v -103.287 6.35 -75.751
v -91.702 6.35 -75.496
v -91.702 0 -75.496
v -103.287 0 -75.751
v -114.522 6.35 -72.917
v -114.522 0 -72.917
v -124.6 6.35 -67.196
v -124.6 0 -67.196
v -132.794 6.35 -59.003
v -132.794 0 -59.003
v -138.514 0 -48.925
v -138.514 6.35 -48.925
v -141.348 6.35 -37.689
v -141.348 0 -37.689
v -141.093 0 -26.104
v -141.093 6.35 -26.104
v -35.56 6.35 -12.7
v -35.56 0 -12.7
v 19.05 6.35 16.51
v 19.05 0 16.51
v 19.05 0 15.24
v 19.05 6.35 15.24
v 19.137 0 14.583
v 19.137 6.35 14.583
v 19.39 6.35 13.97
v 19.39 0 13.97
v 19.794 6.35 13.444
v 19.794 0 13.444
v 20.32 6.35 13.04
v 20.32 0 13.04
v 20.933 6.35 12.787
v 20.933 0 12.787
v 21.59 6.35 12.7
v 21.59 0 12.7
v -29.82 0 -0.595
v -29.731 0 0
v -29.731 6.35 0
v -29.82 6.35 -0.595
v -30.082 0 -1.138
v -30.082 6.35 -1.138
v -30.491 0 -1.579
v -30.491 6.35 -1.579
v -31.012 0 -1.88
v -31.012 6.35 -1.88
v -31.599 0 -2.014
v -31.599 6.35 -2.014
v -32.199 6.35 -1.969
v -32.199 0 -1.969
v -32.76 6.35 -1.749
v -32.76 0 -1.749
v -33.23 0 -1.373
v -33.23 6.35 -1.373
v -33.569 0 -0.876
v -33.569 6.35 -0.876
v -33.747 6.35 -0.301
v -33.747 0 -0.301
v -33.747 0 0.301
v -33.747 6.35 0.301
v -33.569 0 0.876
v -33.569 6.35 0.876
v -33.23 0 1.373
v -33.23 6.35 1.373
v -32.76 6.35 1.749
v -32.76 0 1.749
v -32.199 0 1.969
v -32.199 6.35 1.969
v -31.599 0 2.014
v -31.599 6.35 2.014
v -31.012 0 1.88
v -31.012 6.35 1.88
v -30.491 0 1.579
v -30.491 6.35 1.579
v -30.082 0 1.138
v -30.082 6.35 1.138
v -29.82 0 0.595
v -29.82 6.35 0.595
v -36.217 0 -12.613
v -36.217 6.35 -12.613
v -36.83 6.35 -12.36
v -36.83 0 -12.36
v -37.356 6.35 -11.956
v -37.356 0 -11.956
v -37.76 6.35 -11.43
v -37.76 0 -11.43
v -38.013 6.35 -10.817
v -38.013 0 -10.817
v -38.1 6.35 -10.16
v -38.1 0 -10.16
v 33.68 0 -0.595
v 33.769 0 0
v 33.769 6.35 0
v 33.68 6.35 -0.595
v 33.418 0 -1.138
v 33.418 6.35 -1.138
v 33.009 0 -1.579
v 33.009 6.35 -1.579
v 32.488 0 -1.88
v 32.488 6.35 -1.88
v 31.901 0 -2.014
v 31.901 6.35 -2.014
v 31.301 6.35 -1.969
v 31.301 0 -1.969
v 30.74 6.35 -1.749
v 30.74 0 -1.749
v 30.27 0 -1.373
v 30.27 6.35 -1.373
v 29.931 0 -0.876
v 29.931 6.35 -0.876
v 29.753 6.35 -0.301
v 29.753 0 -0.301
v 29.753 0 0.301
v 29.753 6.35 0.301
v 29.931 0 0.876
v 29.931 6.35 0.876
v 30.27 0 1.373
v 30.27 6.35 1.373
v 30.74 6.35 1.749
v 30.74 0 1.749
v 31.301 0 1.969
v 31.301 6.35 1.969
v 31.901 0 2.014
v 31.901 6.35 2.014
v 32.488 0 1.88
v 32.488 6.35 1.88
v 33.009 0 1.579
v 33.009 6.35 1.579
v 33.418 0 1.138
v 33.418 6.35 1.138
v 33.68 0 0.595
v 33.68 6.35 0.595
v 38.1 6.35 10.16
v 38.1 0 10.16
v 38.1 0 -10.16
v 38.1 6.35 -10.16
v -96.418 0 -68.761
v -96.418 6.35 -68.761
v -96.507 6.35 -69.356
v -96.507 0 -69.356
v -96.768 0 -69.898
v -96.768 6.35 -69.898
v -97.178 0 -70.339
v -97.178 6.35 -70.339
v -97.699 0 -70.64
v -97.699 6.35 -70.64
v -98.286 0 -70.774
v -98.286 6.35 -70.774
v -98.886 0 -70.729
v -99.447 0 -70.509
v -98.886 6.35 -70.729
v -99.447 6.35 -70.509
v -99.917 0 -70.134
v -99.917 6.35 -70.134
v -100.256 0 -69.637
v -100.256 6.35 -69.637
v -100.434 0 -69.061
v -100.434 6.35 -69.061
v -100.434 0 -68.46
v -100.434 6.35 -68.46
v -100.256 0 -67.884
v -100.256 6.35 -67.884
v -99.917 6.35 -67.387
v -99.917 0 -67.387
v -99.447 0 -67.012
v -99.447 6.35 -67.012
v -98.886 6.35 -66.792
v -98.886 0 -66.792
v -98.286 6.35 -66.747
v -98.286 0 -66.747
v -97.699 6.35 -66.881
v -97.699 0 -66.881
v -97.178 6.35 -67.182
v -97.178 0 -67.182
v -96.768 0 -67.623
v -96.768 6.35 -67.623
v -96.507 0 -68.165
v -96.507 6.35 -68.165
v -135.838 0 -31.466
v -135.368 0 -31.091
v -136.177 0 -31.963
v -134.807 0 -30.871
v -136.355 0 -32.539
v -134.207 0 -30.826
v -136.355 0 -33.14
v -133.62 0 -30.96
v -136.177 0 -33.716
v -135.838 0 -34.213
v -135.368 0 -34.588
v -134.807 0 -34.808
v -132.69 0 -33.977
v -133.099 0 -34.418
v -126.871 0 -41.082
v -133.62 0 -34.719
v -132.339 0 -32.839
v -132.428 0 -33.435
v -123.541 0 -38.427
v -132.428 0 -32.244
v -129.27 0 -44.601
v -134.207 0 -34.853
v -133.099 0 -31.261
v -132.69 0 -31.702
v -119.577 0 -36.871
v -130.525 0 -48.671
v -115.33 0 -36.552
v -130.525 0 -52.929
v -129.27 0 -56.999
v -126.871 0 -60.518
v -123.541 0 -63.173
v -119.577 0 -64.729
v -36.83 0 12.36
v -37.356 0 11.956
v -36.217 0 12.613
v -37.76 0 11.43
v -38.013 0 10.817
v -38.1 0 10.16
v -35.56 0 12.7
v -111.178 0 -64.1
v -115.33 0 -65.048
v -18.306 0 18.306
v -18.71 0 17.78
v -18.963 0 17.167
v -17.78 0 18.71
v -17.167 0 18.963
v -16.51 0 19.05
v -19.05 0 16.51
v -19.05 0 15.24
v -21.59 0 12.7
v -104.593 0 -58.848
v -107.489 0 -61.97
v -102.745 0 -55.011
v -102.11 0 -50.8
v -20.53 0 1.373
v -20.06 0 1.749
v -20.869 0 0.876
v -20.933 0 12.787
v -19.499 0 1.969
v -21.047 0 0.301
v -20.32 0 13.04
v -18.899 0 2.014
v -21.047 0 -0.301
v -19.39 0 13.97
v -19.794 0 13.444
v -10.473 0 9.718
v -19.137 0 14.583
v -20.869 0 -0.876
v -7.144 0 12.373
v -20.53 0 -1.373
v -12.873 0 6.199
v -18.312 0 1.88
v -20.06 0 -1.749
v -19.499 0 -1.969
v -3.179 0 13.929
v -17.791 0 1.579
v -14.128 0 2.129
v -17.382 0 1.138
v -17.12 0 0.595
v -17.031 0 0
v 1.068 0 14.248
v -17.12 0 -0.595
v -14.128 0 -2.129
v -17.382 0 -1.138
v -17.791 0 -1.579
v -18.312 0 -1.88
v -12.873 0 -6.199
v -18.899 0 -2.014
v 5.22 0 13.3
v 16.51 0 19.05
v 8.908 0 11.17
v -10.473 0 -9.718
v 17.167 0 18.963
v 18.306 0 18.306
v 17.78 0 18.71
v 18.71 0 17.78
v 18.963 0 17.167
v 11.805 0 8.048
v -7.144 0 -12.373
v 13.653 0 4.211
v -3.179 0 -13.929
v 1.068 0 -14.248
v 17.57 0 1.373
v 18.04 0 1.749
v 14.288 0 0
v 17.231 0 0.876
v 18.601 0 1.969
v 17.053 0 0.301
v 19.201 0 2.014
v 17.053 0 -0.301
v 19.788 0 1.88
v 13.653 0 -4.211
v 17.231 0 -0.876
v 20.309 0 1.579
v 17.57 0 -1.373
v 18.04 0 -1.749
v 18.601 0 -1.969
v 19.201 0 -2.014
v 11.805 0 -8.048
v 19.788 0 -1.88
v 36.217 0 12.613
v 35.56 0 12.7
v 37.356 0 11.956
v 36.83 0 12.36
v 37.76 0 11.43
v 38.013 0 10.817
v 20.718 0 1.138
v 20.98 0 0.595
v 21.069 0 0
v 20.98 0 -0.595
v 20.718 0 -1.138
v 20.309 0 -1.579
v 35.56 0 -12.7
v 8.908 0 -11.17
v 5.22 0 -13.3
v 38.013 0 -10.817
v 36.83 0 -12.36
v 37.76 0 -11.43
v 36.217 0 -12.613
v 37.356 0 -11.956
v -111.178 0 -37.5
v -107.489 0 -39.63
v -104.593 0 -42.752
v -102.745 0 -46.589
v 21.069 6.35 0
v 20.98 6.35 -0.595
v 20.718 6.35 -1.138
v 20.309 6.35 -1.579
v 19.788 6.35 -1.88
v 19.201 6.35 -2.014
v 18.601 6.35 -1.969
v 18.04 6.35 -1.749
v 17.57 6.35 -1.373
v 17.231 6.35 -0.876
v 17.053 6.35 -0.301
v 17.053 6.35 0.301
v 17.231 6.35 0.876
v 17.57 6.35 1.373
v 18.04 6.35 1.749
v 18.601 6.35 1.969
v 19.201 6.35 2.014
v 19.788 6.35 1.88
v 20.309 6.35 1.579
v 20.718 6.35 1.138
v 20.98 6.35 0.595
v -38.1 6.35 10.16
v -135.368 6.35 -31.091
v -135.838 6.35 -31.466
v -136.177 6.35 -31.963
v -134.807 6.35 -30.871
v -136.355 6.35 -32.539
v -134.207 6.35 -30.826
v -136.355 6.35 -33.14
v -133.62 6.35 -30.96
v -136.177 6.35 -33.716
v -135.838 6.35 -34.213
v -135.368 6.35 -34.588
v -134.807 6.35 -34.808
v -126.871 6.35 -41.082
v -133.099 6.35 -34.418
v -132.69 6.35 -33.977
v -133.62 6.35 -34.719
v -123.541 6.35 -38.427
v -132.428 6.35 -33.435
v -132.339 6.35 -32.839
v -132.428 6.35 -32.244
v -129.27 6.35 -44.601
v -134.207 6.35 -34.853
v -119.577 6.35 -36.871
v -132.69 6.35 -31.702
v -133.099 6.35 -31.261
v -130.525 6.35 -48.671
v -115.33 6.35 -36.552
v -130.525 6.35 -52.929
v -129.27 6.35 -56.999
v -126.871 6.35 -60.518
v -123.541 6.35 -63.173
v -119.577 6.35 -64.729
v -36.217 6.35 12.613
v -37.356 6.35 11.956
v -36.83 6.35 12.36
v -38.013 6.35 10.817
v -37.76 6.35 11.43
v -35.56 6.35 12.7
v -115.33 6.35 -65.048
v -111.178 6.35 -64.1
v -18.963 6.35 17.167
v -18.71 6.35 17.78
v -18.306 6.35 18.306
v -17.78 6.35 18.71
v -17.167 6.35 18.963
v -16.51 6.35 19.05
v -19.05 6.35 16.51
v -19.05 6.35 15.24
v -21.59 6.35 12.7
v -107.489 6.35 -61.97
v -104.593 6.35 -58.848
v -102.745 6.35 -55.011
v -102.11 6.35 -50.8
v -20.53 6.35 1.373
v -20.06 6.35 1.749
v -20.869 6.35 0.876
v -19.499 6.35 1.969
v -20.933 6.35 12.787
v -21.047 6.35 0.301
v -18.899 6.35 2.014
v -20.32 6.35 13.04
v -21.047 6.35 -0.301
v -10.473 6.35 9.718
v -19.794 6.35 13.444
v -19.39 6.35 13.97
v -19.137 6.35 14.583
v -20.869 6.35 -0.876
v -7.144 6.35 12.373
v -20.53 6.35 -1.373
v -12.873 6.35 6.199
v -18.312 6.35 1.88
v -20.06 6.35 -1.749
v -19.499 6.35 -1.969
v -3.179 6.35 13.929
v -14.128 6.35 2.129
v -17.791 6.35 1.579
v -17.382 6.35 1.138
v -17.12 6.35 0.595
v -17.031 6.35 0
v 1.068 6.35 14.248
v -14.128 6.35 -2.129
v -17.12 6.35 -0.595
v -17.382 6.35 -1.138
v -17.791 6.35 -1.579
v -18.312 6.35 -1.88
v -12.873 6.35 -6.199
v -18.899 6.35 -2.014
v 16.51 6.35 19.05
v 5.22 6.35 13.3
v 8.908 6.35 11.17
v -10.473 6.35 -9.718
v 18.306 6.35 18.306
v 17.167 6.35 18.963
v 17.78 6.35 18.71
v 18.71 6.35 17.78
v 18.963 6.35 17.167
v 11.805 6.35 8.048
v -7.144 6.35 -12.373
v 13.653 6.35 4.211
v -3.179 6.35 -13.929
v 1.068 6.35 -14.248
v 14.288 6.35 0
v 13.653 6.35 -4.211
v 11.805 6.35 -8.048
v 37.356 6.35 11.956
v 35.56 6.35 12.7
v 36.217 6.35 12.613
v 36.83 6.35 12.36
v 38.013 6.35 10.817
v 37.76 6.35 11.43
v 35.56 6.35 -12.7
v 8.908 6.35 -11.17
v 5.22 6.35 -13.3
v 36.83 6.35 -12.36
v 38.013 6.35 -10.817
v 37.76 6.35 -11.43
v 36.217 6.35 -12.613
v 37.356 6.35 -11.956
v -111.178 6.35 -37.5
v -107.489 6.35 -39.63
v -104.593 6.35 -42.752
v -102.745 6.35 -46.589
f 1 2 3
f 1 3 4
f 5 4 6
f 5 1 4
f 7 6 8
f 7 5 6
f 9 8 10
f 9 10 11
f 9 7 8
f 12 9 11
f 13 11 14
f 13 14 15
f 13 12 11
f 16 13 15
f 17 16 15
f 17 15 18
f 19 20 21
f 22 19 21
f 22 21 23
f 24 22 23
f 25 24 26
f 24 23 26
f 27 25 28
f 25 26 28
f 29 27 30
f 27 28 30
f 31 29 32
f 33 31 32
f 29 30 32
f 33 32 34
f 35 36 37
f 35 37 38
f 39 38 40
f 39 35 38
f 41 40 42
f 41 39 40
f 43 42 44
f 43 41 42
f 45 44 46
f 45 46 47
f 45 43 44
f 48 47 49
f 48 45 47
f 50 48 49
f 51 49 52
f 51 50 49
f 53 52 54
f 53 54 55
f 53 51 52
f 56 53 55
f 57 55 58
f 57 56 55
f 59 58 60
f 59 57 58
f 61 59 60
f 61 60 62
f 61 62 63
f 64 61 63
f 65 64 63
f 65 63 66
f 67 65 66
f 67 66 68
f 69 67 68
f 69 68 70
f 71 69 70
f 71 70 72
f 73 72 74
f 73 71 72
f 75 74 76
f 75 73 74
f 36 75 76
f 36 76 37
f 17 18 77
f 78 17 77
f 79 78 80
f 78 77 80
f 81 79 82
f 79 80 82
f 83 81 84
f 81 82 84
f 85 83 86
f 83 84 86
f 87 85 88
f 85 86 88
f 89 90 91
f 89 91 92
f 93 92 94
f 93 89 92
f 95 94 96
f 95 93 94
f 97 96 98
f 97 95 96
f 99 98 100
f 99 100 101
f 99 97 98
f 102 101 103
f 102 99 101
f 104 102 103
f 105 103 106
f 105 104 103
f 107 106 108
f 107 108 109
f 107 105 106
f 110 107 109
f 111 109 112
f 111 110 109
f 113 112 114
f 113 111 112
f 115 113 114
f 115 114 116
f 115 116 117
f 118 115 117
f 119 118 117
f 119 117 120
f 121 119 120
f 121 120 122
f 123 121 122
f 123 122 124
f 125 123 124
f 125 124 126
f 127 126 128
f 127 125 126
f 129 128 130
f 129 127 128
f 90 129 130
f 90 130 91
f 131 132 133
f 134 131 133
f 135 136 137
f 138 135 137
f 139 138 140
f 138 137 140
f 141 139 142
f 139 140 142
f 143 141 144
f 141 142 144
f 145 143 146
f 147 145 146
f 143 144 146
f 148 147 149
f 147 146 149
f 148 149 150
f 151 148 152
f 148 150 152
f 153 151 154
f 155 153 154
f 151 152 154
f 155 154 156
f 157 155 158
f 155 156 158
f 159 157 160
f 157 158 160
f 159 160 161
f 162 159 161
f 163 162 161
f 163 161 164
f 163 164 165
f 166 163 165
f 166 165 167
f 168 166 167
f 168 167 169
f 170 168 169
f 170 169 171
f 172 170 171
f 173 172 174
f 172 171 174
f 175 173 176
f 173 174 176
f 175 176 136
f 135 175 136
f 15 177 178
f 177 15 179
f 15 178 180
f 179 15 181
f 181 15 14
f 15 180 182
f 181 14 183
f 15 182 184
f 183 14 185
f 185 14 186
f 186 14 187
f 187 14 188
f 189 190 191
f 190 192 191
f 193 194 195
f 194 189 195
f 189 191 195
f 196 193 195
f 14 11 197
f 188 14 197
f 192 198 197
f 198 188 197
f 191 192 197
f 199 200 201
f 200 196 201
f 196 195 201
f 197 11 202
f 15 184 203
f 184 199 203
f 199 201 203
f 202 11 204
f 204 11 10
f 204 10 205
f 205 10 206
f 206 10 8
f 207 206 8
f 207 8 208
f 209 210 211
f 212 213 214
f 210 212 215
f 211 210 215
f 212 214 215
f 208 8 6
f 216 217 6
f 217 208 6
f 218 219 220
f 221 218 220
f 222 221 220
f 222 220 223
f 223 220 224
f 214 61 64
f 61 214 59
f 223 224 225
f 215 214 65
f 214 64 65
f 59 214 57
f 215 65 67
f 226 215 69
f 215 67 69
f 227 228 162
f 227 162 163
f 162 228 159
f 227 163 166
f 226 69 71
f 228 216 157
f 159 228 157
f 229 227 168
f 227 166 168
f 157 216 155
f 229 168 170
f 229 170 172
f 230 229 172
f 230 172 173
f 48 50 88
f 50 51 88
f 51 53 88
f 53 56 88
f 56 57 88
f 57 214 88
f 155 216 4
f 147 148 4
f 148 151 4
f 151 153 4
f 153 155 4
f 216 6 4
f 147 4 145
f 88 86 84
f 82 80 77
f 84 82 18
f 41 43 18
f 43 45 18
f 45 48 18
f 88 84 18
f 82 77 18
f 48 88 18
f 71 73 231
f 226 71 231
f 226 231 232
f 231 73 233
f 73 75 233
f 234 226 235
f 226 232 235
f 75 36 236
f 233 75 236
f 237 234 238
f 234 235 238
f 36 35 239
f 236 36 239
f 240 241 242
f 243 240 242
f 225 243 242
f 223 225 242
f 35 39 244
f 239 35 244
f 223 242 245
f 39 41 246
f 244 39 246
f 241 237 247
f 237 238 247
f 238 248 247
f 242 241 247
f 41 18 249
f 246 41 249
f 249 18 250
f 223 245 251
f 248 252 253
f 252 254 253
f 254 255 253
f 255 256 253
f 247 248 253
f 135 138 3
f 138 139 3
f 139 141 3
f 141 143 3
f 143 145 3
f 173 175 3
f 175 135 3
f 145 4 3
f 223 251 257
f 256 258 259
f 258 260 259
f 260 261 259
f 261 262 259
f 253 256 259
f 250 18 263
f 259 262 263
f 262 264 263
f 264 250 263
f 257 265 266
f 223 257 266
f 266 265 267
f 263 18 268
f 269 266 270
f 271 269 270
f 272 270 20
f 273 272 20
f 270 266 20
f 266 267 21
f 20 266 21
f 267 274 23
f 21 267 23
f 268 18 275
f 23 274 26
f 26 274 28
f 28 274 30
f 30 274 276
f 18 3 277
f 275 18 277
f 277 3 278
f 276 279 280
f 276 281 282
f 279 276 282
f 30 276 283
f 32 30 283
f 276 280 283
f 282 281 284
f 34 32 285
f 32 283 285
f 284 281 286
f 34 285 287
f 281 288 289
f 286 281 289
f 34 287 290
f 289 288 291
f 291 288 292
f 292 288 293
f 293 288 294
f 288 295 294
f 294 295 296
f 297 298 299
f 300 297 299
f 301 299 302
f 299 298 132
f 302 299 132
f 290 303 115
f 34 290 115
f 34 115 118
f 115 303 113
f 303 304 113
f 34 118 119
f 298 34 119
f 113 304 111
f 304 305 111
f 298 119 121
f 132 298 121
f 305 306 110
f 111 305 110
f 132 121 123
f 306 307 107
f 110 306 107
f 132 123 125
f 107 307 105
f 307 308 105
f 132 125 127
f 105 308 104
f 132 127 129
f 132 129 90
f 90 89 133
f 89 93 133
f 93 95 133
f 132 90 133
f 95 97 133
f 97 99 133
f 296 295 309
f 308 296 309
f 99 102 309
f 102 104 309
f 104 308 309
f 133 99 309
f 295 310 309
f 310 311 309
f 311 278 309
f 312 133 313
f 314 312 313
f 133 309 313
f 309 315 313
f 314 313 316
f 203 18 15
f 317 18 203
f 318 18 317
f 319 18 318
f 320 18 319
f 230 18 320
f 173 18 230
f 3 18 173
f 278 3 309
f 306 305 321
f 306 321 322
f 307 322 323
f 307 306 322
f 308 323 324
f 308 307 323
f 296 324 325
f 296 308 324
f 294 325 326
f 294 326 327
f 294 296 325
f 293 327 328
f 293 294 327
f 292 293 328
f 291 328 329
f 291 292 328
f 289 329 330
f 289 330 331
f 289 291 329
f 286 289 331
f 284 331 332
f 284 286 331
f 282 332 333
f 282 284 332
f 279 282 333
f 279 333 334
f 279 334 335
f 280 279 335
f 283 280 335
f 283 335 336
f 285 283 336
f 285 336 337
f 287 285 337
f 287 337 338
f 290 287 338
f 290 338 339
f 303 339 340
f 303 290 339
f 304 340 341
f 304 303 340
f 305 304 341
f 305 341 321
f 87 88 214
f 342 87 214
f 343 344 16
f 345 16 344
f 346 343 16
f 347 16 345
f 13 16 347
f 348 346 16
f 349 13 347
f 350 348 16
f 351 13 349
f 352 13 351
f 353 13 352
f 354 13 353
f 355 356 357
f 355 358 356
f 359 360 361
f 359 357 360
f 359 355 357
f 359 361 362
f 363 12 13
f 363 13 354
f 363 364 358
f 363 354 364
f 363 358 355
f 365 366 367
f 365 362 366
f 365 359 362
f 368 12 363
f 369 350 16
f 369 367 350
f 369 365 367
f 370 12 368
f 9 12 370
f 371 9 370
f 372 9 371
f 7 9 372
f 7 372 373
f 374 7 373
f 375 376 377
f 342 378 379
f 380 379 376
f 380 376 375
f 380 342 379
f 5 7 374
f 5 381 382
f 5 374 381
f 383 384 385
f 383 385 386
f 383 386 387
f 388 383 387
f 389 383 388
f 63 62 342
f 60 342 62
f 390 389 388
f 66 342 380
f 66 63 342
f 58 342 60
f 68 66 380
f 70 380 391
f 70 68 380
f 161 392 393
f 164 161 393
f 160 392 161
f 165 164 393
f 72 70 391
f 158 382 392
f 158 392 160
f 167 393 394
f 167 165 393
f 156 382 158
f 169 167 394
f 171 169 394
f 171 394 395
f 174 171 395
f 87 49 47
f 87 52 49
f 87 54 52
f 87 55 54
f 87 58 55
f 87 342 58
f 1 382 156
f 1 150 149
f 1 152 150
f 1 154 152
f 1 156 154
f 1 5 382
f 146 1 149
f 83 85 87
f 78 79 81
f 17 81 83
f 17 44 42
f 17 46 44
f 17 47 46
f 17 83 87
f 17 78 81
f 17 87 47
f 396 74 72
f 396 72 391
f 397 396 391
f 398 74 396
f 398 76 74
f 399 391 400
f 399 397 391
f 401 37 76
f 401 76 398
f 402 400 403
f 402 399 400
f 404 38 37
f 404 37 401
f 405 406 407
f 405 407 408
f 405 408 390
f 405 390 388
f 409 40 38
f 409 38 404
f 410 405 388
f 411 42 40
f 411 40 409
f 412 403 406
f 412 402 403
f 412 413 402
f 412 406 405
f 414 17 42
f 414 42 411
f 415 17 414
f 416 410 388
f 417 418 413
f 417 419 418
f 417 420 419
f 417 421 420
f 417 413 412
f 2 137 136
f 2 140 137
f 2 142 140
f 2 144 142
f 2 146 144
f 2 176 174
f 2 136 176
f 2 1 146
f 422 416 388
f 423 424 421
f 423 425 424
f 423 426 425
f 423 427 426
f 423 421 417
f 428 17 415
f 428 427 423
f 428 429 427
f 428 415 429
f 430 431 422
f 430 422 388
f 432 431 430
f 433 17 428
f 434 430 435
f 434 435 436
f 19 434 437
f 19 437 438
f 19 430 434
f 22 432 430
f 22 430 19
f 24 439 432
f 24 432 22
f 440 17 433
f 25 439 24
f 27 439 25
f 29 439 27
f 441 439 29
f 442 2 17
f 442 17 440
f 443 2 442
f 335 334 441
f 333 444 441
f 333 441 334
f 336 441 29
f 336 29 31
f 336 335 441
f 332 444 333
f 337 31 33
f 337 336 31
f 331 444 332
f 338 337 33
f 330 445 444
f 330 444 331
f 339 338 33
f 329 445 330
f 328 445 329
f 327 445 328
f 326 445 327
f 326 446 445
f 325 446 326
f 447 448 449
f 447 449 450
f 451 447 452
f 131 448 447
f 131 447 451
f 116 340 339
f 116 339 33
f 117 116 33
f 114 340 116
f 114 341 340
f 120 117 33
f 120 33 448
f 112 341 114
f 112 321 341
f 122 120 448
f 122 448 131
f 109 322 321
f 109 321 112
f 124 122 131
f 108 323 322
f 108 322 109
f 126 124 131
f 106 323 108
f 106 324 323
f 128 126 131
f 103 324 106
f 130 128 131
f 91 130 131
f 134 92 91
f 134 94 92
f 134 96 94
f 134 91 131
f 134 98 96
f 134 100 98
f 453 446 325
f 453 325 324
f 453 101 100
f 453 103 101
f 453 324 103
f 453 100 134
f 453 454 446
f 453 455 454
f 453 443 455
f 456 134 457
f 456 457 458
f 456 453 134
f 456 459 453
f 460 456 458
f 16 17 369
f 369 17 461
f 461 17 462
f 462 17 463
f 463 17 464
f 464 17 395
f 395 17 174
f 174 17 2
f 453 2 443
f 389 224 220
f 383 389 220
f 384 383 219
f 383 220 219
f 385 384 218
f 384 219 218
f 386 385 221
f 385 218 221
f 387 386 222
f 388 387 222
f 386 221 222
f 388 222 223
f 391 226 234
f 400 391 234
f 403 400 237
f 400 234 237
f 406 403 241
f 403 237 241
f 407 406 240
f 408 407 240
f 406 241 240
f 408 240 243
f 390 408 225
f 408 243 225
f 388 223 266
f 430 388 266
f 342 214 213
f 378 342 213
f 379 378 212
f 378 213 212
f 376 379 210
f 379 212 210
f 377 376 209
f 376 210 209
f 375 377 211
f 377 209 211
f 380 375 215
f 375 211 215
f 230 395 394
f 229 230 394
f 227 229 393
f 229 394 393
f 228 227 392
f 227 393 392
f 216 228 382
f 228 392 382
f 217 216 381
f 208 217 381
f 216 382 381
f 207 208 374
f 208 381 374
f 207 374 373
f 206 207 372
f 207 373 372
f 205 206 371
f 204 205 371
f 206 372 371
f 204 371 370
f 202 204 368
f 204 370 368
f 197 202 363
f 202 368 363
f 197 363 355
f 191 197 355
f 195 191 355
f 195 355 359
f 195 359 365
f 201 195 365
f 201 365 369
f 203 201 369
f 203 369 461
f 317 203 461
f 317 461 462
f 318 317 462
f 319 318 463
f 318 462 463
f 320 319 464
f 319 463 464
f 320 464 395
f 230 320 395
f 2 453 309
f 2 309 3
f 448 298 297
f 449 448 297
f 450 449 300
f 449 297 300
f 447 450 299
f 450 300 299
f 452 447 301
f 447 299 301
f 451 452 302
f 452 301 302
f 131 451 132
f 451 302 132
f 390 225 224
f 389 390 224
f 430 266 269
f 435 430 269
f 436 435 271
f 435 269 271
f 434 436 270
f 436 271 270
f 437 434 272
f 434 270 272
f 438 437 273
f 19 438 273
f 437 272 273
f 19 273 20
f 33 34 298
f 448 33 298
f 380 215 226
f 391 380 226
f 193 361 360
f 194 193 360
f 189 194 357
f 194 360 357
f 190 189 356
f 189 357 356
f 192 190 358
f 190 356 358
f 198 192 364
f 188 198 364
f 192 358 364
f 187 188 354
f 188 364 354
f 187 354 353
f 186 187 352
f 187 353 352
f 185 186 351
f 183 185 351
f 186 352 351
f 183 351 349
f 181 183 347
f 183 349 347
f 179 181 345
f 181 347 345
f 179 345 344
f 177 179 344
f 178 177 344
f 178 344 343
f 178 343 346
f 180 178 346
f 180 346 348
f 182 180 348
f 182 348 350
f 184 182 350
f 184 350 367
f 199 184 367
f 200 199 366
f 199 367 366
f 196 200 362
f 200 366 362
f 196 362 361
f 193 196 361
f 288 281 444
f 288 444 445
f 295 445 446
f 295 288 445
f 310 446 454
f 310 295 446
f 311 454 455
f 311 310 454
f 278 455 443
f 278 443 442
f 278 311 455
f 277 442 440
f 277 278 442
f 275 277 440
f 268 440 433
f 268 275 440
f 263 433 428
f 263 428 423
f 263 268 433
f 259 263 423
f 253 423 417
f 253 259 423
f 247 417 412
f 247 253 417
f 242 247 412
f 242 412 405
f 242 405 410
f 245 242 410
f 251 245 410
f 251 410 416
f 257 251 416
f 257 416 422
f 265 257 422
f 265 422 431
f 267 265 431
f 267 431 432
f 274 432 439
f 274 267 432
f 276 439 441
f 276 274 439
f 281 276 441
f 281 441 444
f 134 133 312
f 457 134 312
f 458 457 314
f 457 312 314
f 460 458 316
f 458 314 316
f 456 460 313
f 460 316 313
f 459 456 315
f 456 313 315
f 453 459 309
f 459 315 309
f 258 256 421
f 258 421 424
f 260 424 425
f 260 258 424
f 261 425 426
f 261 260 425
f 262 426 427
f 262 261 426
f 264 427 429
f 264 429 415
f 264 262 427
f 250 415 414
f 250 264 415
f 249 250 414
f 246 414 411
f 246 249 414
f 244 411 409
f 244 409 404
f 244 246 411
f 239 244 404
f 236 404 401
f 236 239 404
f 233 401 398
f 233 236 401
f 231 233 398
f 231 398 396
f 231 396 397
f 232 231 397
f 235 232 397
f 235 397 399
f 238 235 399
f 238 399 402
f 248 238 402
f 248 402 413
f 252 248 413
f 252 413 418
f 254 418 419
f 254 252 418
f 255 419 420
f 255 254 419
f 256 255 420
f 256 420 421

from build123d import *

# Parameters (mm, degrees)
SKETCH1_R           = 14.2875
SKETCH1_R_2         = 2.0193
BOSS_EXTRUDE1_DEPTH = 6.35
SKETCH3_R           = 2.0193
SKETCH3_R_2         = 14.2875
BOSS_EXTRUDE3_DEPTH = 6.35


with BuildPart() as part:
    # Sketch1 → Boss-Extrude1 (new body)
    with BuildSketch(Plane(origin=(0, 0, 0), x_dir=(1, 0, 0), z_dir=(0, 1, 0))):
        with BuildLine():
            Line((-16.51, -19.05), (16.51, -19.05))
            ThreePointArc((16.51, -19.05), (18.306051224, -18.306051224), (19.05, -16.51))
            Line((19.05, -16.51), (19.05, -15.24))
            ThreePointArc((19.05, -15.24), (19.793948776, -13.443948776), (21.59, -12.7))
            Line((21.59, -12.7), (35.56, -12.7))
            ThreePointArc((35.56, -12.7), (37.356051224, -11.956051224), (38.1, -10.16))
            Line((38.1, -10.16), (38.1, 10.16))
            ThreePointArc((38.1, 10.16), (37.356051224, 11.956051224), (35.56, 12.7))
            Line((35.56, 12.7), (21.59, 12.7))
            ThreePointArc((21.59, 12.7), (19.793948776, 13.443948776), (19.05, 15.24))
            Line((19.05, 15.24), (19.05, 16.51))
            ThreePointArc((19.05, 16.51), (18.306051224, 18.306051224), (16.51, 19.05))
            Line((16.51, 19.05), (-16.51, 19.05))
            ThreePointArc((-16.51, 19.05), (-18.306051224, 18.306051224), (-19.05, 16.51))
            Line((-19.05, 16.51), (-19.05, 15.24))
            ThreePointArc((-19.05, 15.24), (-19.793948776, 13.443948776), (-21.59, 12.7))
            Line((-21.59, 12.7), (-35.56, 12.7))
            ThreePointArc((-35.56, 12.7), (-37.356051224, 11.956051224), (-38.1, 10.16))
            Line((-38.1, 10.16), (-38.1, -10.16))
            ThreePointArc((-38.1, -10.16), (-37.356051224, -11.956051224), (-35.56, -12.7))
            Line((-35.56, -12.7), (-21.59, -12.7))
            ThreePointArc((-21.59, -12.7), (-19.793948776, -13.443948776), (-19.05, -15.24))
            Line((-19.05, -15.24), (-19.05, -16.51))
            ThreePointArc((-19.05, -16.51), (-18.306051224, -18.306051224), (-16.51, -19.05))
        make_face()
        Circle(SKETCH1_R, mode=Mode.SUBTRACT)
        with Locations((-31.75, 0)):
            Circle(SKETCH1_R_2, mode=Mode.SUBTRACT)
        with Locations((-19.05, 0)):
            Circle(SKETCH1_R_2, mode=Mode.SUBTRACT)
        with Locations((19.05, 0)):
            Circle(SKETCH1_R_2, mode=Mode.SUBTRACT)
        with Locations((31.75, 0)):
            Circle(SKETCH1_R_2, mode=Mode.SUBTRACT)
    extrude(amount=BOSS_EXTRUDE1_DEPTH)

    # Sketch3 → Boss-Extrude3 (add)
    with BuildSketch(Plane(origin=(0, 6.35, 0), x_dir=(1, 0, 0), z_dir=(0, 1, 0))):
        with BuildLine():
            ThreePointArc((-91.701718319, 75.495704333), (-128.973082608, 63.375659956), (-141.093126985, 26.104295667))
            Line((-141.093126985, 26.104295667), (-35.56, 12.7))
            Line((-35.56, 12.7), (-21.59, 12.7))
            ThreePointArc((-21.59, 12.7), (-19.793948776, 13.443948776), (-19.05, 15.24))
            Line((-19.05, 15.24), (-19.05, 16.51))
            ThreePointArc((-19.05, 16.51), (-18.306051224, 18.306051224), (-16.51, 19.05))
            Line((-16.51, 19.05), (16.51, 19.05))
            ThreePointArc((16.51, 19.05), (18.306051224, 18.306051224), (19.05, 16.51))
            Line((19.05, 16.51), (19.05, 15.24))
            ThreePointArc((19.05, 15.24), (19.793948776, 13.443948776), (21.59, 12.7))
            Line((21.59, 12.7), (35.56, 12.7))
            Line((35.56, 12.7), (-91.701718319, 75.495704333))
        make_face()
        with Locations((-134.357934894, 32.839487758)):
            Circle(SKETCH3_R, mode=Mode.SUBTRACT)
        with Locations((-116.397422652, 50.8)):
            Circle(SKETCH3_R_2, mode=Mode.SUBTRACT)
        with Locations((-98.43691041, 68.760512242)):
            Circle(SKETCH3_R, mode=Mode.SUBTRACT)
    extrude(amount=-BOSS_EXTRUDE3_DEPTH)


solid = part.part
